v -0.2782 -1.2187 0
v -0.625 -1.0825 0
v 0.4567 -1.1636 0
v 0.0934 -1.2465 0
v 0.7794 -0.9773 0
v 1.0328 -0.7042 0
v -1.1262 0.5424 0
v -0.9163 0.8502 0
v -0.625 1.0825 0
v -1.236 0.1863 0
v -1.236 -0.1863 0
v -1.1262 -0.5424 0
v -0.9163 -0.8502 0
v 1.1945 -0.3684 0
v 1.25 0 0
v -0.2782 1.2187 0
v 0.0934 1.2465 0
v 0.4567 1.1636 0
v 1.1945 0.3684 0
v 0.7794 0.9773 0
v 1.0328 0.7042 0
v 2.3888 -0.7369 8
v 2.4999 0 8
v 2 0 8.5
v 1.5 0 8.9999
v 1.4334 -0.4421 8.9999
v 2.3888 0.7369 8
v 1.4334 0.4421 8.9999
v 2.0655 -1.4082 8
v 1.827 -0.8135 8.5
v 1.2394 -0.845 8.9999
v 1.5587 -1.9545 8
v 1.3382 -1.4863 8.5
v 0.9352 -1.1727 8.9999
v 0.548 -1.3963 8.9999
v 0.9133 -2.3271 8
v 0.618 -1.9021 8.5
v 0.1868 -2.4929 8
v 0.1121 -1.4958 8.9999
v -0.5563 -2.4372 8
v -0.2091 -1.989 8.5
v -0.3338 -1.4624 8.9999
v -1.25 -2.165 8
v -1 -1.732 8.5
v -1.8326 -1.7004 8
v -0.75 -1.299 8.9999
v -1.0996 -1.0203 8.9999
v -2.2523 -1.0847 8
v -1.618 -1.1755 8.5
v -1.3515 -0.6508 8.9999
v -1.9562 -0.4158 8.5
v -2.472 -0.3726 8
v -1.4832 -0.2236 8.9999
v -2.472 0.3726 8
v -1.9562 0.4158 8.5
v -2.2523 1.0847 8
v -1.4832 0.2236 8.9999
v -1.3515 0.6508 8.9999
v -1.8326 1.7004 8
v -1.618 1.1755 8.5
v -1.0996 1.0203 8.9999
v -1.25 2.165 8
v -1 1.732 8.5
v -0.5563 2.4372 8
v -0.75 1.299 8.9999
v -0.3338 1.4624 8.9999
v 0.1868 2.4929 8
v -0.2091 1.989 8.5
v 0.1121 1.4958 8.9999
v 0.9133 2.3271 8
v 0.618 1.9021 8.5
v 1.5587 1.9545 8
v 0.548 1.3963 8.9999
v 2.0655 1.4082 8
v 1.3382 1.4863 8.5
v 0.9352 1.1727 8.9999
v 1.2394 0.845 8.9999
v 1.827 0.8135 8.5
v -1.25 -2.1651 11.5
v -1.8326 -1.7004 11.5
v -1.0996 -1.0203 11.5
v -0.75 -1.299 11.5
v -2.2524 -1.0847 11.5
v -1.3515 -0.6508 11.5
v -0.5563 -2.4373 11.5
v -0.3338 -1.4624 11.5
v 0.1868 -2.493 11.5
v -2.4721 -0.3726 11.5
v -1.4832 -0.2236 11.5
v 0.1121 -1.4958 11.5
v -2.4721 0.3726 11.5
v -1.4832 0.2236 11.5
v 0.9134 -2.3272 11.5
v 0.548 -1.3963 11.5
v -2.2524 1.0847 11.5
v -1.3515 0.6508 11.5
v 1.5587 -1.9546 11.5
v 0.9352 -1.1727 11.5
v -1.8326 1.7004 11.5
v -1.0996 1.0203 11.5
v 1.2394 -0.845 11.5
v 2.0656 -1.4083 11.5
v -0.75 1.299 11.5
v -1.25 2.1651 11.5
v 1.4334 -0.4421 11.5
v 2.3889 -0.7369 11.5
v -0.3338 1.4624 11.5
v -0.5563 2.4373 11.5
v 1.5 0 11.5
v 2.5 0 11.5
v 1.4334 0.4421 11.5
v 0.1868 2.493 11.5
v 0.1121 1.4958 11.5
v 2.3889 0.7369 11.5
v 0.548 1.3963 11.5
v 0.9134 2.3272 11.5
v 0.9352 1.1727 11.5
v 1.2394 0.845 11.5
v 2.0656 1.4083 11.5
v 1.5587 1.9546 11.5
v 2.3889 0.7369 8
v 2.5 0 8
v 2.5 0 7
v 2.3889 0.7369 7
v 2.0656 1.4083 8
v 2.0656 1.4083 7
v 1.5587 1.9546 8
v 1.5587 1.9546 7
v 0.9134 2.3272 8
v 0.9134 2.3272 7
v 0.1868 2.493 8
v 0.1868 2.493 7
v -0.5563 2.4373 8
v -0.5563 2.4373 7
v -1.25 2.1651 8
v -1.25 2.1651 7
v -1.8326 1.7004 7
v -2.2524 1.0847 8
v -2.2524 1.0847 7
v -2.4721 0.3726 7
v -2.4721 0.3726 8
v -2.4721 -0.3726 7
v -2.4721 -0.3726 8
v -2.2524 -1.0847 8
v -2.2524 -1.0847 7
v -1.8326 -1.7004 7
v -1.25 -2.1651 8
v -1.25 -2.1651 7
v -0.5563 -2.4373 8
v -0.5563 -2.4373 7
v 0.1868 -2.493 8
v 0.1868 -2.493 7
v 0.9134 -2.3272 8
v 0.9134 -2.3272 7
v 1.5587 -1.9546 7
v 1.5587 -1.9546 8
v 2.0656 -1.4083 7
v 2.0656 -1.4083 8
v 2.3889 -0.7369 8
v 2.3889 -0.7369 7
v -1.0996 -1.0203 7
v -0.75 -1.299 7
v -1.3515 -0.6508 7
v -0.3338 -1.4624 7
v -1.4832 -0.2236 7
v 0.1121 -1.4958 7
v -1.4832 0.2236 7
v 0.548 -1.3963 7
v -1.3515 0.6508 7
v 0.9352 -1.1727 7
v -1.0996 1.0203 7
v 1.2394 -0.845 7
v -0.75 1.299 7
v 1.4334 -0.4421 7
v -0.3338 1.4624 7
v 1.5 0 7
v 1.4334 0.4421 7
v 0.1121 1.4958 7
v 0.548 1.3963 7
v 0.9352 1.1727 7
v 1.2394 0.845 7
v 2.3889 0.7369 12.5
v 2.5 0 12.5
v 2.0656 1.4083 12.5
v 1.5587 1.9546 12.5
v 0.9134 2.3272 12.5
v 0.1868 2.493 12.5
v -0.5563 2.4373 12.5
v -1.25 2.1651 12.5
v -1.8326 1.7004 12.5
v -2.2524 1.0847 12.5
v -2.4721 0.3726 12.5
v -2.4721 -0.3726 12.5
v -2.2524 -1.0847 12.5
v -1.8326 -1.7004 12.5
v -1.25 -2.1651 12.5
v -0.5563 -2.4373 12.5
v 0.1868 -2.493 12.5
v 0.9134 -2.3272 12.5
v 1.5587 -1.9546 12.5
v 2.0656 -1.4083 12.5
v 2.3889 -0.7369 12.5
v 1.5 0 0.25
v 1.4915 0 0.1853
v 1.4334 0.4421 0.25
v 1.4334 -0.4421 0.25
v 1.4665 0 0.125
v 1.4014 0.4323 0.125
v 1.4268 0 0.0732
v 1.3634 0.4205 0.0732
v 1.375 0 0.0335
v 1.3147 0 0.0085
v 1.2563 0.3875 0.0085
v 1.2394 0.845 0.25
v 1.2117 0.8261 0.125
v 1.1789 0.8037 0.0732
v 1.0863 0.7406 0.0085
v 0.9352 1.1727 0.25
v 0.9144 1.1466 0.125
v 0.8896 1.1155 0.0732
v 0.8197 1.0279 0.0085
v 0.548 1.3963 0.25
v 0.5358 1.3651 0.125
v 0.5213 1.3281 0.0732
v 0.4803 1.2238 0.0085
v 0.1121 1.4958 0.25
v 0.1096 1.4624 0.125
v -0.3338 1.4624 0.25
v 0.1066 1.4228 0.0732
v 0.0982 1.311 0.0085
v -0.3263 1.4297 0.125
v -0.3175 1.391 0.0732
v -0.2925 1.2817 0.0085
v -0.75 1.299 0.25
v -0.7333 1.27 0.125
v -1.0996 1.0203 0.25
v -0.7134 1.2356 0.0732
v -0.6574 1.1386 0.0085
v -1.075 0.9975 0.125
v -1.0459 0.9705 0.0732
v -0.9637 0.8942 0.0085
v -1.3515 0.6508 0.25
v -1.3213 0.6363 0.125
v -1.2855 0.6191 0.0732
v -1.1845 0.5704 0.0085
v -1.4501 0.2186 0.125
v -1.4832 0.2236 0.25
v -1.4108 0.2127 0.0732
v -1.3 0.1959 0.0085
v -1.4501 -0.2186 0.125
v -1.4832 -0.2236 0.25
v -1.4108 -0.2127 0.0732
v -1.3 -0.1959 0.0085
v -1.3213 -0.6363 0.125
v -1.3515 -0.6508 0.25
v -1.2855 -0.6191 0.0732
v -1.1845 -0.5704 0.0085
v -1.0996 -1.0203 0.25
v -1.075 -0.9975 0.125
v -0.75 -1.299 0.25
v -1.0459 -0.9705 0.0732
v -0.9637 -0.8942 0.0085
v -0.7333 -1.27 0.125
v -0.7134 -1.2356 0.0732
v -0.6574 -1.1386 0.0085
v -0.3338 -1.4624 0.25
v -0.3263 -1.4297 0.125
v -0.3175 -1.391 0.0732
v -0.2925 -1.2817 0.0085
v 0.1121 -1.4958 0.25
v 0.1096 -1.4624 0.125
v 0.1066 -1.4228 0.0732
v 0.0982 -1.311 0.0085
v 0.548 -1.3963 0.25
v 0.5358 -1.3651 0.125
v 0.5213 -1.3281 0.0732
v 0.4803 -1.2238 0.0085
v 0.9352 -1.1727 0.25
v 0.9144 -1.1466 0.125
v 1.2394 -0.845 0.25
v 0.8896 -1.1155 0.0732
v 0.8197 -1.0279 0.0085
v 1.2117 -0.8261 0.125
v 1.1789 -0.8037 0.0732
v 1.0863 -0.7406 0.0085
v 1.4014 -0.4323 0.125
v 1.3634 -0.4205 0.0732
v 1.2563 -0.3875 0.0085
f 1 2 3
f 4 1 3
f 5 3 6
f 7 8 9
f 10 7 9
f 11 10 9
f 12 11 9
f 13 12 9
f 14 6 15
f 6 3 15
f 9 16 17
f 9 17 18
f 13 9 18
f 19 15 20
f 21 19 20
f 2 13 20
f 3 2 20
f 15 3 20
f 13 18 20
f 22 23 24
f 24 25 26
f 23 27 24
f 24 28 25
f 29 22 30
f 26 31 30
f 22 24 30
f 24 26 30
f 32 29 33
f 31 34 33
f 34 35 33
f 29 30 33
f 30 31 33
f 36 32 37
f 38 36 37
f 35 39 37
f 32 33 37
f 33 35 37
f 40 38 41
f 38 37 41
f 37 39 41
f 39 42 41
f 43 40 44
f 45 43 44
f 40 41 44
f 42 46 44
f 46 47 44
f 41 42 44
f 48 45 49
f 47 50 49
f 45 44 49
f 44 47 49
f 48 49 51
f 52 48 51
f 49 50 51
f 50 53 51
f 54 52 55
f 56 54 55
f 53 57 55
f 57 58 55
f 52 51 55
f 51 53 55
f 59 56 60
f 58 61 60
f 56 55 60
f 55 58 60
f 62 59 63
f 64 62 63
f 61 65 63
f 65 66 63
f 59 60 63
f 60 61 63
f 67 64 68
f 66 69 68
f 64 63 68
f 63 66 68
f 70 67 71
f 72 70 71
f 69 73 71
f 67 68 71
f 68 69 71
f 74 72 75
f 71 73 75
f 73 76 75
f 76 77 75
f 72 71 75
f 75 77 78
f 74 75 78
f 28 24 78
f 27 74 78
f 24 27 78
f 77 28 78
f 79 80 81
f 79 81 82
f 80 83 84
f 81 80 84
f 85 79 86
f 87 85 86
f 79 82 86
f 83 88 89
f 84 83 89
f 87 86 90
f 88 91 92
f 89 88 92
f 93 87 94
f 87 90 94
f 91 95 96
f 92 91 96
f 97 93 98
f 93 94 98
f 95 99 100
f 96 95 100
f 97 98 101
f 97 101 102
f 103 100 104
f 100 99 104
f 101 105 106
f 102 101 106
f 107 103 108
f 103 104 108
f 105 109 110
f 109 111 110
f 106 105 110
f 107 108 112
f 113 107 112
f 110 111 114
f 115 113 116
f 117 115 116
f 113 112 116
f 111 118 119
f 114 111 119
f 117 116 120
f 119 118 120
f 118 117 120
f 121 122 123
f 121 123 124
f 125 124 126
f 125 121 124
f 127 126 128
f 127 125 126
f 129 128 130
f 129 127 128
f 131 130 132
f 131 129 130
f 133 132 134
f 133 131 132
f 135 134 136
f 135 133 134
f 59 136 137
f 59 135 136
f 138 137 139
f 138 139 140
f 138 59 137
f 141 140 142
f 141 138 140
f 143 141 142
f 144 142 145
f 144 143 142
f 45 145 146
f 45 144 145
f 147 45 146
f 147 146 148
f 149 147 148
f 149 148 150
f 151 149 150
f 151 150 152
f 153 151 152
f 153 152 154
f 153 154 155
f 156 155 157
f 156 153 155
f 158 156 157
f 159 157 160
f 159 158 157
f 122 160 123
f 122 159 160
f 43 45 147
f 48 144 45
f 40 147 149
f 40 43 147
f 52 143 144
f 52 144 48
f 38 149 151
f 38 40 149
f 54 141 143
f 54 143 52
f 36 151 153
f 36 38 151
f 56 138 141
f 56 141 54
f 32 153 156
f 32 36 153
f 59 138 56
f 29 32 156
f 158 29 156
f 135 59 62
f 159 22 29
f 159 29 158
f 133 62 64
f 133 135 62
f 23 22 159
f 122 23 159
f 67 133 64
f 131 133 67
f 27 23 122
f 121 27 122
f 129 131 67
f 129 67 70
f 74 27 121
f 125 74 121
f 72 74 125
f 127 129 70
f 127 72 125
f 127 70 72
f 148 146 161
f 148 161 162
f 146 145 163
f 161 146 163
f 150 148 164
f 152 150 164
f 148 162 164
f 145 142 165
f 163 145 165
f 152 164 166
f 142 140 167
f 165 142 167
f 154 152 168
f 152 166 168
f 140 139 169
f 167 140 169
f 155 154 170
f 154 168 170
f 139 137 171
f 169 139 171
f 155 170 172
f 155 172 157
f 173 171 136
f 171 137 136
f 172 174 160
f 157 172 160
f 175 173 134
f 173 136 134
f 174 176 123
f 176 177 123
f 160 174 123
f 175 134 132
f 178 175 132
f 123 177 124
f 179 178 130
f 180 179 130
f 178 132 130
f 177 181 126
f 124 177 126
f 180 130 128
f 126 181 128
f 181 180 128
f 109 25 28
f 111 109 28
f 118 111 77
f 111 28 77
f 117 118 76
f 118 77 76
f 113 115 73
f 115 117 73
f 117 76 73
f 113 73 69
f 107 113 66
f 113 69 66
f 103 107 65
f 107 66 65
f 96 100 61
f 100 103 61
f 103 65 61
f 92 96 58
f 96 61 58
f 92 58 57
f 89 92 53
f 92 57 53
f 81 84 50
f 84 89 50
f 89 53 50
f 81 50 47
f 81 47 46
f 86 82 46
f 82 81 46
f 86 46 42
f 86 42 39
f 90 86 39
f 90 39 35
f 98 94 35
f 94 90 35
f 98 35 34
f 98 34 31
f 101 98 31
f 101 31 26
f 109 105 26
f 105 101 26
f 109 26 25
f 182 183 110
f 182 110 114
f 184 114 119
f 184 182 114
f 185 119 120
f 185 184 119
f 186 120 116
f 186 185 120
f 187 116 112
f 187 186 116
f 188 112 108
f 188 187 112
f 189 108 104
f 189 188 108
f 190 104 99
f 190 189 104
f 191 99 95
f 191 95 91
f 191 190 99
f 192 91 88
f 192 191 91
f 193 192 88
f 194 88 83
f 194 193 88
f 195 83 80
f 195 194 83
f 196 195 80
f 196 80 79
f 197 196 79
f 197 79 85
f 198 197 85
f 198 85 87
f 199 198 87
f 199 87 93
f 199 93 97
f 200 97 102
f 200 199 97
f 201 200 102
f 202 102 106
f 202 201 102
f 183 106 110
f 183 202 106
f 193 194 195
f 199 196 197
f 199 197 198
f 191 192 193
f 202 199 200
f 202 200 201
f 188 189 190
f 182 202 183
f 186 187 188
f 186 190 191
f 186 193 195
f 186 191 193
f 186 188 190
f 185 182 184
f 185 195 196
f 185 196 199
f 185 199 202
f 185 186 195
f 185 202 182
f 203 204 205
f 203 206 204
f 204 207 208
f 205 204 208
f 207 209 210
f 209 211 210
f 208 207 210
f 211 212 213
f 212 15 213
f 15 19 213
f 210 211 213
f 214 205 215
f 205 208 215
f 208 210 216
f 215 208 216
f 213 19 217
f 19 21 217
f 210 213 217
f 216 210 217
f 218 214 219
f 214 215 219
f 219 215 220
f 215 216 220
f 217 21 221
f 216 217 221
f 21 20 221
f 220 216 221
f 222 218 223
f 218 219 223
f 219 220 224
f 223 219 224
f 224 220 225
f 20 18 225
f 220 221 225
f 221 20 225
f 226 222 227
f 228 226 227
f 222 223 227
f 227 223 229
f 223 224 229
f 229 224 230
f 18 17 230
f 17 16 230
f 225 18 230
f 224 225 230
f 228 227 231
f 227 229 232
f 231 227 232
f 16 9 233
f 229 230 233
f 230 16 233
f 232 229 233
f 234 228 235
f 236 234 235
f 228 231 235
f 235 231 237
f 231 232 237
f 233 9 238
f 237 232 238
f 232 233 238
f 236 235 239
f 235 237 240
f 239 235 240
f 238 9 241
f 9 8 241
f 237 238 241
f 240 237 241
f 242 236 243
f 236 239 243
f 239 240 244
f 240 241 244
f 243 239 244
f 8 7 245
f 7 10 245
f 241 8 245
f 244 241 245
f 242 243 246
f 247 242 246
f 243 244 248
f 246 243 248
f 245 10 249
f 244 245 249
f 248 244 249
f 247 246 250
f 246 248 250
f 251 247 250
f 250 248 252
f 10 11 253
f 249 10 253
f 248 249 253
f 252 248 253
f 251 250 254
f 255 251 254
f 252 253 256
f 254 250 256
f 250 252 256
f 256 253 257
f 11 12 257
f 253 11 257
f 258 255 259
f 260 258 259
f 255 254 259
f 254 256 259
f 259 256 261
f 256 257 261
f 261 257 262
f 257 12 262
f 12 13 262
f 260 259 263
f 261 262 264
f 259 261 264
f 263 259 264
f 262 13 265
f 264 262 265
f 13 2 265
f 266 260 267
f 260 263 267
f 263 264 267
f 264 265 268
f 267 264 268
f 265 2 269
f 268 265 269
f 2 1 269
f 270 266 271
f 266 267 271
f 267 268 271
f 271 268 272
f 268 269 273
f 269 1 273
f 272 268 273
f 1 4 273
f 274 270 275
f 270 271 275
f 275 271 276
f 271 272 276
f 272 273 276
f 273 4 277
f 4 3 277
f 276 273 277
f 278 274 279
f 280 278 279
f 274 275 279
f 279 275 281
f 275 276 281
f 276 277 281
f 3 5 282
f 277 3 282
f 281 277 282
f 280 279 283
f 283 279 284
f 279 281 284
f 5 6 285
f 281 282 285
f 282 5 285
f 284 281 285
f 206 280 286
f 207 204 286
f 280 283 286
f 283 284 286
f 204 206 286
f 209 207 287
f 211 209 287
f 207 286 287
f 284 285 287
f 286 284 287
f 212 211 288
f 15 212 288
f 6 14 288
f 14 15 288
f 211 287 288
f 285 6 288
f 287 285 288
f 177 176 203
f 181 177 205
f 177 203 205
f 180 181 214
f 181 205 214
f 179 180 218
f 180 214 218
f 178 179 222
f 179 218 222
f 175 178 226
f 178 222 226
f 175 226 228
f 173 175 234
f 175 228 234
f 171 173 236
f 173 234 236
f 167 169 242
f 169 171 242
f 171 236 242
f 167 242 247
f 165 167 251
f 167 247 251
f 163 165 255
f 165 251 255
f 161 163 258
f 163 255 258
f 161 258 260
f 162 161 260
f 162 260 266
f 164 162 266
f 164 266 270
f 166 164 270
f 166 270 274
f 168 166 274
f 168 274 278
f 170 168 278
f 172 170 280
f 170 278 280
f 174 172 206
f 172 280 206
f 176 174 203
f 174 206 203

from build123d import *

# Parameters (mm, degrees)
SKETCH1_R           = 1.5
BOSS_EXTRUDE1_DEPTH = 12.5
SKETCH2_R           = 2.5
BOSS_EXTRUDE2_DEPTH = 1
FILLET1_R           = 0.25
BOSS_EXTRUDE4_START = -4.5
SKETCH4_R           = 2.5
BOSS_EXTRUDE4_DEPTH = 1
CHAMFER2_SIZE       = 1


with BuildPart() as part:
    # Sketch1 → Boss-Extrude1 (new body)
    with BuildSketch(Plane.XY):
        Circle(SKETCH1_R)
    extrude(amount=BOSS_EXTRUDE1_DEPTH)

    # Sketch2 → Boss-Extrude2 (add)
    with BuildSketch(Plane.XY.offset(12.5)):
        Circle(SKETCH2_R)
    extrude(amount=-BOSS_EXTRUDE2_DEPTH)

    # Fillet1
    fillet1_edges = [part.edges().sort_by_distance(p)[0] for p in [
        (-1.5, 0, 0),
    ]]
    fillet(fillet1_edges, radius=FILLET1_R)

    # Sketch4 → Boss-Extrude4 (add)
    with BuildSketch(Plane.XY.offset(12.5).offset(BOSS_EXTRUDE4_START)):
        Circle(SKETCH4_R)
    extrude(amount=-BOSS_EXTRUDE4_DEPTH)

    # Chamfer2
    chamfer2_edges = [part.edges().sort_by_distance(p)[0] for p in [
        (-1.5, 0, 8),
    ]]
    chamfer(chamfer2_edges, length=CHAMFER2_SIZE - 0.0001)  # a hair under: the kernel refuses the full size


solid = part.part
